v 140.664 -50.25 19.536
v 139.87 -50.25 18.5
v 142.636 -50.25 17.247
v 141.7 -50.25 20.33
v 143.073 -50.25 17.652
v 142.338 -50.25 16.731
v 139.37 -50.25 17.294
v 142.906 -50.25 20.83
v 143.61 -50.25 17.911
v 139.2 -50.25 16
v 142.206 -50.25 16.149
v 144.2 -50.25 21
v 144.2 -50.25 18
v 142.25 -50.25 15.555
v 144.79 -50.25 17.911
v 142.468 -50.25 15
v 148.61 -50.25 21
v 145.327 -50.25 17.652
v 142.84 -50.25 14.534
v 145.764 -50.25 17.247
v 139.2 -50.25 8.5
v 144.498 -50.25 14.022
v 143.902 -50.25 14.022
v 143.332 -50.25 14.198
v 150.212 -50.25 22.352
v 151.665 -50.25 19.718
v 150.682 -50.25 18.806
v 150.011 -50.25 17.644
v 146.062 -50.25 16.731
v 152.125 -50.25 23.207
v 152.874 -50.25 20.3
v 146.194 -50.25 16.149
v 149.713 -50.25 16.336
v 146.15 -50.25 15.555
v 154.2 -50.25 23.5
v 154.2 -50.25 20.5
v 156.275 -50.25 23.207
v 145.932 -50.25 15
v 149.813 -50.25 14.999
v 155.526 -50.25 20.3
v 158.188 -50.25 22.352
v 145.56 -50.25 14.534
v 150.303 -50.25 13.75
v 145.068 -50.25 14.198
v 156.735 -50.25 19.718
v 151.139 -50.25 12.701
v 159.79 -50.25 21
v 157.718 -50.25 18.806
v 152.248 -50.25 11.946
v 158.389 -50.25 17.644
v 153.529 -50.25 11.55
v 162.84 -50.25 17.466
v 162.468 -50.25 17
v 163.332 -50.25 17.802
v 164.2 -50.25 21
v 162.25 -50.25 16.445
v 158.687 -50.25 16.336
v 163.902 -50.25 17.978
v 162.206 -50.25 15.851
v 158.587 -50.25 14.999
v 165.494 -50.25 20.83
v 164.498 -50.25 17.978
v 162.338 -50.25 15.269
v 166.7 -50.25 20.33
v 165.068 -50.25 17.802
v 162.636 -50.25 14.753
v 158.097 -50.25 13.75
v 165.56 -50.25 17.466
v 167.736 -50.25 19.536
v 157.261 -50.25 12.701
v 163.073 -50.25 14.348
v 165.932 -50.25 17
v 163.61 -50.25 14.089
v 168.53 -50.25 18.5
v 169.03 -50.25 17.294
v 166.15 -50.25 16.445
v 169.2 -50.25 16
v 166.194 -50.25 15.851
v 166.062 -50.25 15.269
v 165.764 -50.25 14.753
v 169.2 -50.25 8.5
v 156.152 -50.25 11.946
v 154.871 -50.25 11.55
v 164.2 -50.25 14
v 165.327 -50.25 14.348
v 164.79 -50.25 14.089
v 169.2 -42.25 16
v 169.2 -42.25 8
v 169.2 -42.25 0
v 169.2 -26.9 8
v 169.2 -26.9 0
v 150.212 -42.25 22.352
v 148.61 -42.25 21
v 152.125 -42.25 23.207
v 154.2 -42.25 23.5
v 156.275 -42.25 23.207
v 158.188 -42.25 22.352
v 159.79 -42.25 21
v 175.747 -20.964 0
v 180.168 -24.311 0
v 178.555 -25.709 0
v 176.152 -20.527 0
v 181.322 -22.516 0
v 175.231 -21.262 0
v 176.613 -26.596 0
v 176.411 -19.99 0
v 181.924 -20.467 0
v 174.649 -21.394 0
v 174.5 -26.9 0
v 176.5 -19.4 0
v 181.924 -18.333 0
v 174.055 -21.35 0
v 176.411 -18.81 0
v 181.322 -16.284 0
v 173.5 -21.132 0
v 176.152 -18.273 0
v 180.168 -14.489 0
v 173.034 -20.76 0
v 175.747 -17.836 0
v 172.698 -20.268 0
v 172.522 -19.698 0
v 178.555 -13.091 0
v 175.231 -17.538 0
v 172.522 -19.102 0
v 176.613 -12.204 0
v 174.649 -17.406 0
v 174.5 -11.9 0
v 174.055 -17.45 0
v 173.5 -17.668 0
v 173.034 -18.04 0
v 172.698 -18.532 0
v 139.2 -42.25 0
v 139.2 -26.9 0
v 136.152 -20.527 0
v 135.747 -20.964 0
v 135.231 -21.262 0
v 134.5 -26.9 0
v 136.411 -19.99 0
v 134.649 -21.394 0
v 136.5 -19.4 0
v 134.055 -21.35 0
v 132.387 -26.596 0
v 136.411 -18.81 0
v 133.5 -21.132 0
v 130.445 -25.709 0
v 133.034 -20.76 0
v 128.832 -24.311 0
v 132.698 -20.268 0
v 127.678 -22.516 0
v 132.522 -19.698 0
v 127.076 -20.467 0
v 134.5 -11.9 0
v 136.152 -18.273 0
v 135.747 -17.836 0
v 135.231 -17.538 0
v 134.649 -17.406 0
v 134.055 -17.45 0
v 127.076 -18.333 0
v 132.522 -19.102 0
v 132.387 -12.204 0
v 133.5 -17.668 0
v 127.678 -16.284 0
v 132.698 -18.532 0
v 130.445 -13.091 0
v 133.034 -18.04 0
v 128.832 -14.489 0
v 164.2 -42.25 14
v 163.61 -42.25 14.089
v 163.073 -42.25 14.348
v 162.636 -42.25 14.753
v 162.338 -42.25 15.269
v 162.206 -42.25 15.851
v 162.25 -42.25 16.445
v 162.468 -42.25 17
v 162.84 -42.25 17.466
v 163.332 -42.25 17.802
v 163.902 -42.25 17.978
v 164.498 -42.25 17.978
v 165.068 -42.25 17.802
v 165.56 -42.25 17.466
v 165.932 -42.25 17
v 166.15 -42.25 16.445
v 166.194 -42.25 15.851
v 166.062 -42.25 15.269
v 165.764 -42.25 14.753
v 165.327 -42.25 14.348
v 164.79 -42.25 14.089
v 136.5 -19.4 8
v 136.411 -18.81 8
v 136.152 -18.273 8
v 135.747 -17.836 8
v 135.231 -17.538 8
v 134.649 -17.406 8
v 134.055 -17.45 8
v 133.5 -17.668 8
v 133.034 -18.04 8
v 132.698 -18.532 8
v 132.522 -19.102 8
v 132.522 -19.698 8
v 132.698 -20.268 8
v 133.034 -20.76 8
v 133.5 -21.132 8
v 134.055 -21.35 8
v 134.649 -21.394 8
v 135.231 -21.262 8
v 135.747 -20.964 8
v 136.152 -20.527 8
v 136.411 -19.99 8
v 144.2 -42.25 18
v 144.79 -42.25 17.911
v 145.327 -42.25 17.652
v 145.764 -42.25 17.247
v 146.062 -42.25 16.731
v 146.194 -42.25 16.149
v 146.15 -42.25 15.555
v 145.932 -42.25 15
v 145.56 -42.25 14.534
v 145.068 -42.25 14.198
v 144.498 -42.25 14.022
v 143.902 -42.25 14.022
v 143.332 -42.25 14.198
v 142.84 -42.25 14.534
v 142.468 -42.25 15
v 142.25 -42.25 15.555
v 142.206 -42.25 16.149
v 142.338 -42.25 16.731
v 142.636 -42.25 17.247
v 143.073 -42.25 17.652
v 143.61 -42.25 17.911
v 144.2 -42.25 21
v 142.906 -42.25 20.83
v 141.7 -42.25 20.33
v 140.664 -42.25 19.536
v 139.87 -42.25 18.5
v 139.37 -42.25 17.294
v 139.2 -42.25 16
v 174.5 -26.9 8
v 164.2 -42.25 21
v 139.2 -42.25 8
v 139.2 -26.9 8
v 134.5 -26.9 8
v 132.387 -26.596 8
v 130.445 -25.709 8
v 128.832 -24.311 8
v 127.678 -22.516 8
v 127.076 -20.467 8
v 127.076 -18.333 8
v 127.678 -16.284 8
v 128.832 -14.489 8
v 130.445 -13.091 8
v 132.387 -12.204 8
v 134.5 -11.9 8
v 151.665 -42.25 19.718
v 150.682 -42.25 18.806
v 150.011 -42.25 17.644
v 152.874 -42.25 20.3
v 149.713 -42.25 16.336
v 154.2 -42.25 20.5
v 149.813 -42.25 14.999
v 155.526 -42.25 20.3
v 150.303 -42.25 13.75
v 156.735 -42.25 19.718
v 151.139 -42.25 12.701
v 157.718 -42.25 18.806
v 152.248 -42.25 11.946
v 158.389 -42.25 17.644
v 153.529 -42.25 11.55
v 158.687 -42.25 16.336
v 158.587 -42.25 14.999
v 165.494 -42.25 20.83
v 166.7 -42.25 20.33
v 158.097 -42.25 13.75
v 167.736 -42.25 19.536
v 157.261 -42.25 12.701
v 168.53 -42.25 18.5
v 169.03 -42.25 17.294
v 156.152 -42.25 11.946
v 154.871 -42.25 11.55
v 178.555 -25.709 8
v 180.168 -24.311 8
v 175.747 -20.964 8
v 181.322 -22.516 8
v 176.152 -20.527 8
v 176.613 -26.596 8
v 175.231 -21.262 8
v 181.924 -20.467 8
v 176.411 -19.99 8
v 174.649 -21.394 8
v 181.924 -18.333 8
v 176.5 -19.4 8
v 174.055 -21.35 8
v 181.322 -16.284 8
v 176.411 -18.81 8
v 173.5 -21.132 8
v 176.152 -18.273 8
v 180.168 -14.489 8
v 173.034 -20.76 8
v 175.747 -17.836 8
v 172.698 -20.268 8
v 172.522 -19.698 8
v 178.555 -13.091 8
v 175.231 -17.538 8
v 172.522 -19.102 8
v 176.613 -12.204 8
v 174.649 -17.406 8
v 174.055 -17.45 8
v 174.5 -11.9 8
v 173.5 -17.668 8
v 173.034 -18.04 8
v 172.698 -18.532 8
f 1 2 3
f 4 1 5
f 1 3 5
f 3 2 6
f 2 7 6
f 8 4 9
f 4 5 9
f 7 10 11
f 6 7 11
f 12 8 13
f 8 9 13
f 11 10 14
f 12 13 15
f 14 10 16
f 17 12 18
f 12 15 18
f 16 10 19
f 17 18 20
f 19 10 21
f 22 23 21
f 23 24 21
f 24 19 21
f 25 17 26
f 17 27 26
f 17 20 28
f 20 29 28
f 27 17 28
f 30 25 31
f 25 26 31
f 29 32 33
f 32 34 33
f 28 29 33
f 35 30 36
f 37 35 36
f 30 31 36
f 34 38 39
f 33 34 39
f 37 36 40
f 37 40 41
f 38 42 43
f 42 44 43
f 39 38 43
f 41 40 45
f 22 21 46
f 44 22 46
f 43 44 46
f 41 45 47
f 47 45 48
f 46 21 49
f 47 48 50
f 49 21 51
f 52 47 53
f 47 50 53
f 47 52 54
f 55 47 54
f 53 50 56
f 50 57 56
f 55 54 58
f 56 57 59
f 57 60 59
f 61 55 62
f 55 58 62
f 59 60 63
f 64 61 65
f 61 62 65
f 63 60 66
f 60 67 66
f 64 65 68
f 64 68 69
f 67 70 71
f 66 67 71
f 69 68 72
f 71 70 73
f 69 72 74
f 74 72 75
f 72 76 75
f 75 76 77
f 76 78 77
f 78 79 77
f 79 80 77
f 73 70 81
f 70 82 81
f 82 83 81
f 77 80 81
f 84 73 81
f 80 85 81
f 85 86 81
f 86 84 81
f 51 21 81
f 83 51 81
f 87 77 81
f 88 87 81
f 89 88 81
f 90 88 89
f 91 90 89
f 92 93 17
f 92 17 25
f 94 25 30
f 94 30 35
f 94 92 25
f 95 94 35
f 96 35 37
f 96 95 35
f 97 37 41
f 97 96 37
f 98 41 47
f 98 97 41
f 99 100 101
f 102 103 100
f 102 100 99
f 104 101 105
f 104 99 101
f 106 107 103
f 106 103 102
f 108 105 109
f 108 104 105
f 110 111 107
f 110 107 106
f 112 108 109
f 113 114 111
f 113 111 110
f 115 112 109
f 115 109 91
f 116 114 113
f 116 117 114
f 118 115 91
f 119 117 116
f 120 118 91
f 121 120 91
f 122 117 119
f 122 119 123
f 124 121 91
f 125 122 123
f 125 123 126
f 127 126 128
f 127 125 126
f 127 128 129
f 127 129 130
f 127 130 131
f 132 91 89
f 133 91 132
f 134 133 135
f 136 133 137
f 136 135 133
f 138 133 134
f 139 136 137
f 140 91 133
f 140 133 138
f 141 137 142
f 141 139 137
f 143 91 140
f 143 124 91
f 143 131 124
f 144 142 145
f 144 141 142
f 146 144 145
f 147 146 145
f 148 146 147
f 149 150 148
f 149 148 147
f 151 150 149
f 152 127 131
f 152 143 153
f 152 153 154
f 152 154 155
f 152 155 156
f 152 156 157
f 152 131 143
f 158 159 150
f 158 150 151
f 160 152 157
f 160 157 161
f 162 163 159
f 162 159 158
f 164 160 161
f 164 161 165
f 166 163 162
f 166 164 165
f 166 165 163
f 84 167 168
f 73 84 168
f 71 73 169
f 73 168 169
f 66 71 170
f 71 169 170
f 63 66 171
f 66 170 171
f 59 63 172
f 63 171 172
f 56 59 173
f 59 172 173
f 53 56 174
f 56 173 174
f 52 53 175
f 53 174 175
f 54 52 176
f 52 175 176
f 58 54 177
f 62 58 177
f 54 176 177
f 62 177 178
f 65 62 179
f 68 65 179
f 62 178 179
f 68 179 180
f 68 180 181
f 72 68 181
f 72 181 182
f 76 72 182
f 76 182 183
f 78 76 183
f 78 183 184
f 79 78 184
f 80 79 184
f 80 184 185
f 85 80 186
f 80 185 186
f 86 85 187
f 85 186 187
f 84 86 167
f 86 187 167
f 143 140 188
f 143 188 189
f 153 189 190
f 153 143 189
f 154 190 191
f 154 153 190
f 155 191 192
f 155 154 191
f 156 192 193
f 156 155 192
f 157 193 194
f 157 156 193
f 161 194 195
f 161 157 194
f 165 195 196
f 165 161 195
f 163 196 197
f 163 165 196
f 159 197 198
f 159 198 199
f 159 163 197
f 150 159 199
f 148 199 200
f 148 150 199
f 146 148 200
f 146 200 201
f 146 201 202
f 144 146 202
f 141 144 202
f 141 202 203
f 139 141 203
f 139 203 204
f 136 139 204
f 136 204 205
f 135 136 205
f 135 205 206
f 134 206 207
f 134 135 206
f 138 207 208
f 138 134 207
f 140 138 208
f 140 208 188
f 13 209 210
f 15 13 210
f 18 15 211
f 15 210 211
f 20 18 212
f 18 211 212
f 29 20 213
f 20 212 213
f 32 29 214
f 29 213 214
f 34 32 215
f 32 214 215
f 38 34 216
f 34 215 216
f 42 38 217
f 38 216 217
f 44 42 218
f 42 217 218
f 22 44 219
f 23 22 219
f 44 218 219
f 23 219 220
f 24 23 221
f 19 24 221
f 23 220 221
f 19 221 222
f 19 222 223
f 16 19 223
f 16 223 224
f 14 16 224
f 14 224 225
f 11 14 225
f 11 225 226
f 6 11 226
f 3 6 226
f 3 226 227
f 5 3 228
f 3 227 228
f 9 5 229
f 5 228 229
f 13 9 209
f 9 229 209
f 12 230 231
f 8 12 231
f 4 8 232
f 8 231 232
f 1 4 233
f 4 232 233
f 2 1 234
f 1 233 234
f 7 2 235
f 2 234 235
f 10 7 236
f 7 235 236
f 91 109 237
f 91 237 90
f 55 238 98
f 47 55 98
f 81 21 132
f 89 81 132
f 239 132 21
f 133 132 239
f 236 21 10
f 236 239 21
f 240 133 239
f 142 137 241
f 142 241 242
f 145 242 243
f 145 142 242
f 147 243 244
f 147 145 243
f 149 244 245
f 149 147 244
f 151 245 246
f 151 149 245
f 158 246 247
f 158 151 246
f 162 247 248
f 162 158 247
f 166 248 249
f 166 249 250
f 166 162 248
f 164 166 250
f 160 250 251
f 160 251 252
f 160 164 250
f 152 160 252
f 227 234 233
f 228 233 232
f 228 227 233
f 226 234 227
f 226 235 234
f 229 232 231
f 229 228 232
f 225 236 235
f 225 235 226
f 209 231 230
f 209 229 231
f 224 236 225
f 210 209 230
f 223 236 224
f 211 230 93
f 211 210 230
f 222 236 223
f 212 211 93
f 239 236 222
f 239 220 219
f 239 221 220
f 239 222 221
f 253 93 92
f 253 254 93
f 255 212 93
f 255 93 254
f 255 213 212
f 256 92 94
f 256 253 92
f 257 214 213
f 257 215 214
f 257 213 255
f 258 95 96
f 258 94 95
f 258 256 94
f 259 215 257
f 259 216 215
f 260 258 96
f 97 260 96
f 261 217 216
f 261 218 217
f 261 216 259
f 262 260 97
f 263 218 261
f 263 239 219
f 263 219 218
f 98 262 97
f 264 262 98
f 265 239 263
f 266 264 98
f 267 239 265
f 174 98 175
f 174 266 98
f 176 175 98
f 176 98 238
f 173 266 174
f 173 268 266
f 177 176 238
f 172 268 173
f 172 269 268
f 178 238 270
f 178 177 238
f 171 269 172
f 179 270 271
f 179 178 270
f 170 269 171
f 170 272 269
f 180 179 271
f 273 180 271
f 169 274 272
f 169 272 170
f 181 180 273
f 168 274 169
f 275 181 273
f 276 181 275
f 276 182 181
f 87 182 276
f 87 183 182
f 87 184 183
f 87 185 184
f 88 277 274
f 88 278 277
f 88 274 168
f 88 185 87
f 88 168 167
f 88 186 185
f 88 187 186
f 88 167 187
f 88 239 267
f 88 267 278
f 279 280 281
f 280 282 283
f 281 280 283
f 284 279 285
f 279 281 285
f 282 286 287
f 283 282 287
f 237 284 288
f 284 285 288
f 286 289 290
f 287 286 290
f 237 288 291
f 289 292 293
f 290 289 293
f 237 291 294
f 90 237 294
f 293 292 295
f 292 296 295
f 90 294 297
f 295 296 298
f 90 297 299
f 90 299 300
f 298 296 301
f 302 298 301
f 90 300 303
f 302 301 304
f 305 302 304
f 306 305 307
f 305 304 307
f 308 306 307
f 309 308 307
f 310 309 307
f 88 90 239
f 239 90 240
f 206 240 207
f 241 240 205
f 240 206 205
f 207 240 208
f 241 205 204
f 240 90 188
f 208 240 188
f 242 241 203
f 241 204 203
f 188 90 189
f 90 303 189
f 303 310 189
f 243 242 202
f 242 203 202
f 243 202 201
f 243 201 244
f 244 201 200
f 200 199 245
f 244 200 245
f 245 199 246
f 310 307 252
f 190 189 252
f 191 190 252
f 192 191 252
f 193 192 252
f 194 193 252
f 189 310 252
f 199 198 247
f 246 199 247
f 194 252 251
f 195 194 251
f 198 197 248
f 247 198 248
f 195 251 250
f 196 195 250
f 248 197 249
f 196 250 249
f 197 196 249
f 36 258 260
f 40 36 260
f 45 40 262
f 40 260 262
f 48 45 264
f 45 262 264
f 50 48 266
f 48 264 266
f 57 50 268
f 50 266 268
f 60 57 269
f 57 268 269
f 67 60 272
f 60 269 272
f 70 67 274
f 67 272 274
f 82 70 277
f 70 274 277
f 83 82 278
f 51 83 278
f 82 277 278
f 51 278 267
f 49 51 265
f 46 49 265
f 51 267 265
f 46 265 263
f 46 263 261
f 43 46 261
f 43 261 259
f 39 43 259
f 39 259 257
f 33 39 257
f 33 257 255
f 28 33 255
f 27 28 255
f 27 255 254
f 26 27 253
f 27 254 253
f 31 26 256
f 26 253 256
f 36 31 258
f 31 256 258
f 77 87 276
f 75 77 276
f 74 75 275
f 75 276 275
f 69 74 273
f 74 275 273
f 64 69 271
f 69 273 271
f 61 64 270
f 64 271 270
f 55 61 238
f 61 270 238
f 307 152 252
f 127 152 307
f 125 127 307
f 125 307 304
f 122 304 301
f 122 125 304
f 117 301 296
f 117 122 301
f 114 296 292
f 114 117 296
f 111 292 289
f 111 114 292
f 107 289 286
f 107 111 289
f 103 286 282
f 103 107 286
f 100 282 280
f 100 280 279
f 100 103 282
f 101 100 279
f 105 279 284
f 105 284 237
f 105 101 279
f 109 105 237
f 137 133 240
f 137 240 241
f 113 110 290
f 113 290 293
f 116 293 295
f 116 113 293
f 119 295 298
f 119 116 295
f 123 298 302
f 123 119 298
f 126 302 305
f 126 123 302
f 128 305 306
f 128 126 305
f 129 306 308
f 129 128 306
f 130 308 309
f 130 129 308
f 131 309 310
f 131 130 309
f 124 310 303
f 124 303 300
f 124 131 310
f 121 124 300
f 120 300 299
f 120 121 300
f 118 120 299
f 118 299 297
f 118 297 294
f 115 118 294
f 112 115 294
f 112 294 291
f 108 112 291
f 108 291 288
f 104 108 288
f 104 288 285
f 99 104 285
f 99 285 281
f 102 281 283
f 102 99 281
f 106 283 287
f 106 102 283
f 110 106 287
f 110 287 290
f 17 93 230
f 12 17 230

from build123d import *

# Parameters (mm, degrees)
SKETCH1_R           = 2
BOSS_EXTRUDE1_DEPTH = 8
SKETCH2_R           = 7.5
SKETCH2_R_2         = 4.5
BOSS_EXTRUDE2_DEPTH = 8
SKETCH3_R           = 2
BOSS_EXTRUDE3_DEPTH = 8
SKETCH8_W           = 30
SKETCH8_H           = 8
BOSS_EXTRUDE7_DEPTH = 15.35
BOSS_EXTRUDE8_DEPTH = 30
BOSS_EXTRUDE9_DEPTH = 8


with BuildPart() as part:
    # Sketch1 → Boss-Extrude1 (new body)
    with BuildSketch(Plane.XY):
        with BuildLine():
            Line((134.5, -11.9), (174.5, -11.9))
            ThreePointArc((174.5, -11.9), (182, -19.4), (174.5, -26.9))
            Line((174.5, -26.9), (134.5, -26.9))
            ThreePointArc((134.5, -26.9), (127, -19.4), (134.5, -11.9))
        make_face()
        with Locations((134.5, -19.4)):
            Circle(SKETCH1_R, mode=Mode.SUBTRACT)
        with Locations((174.5, -19.4)):
            Circle(SKETCH1_R, mode=Mode.SUBTRACT)
    extrude(amount=BOSS_EXTRUDE1_DEPTH)

    # Sketch8 → Boss-Extrude7 (add)
    with BuildSketch(Plane(origin=(0, -26.9, 0), x_dir=(-1, 0, 0), z_dir=(0, -1, 0))):
        with Locations((-154.2, -4)):
            Rectangle(SKETCH8_W, SKETCH8_H)
    extrude(amount=BOSS_EXTRUDE7_DEPTH)



with BuildPart() as body_2:
    # Sketch2 → Boss-Extrude2 (new body)
    with BuildSketch(Plane(origin=(0, -42.25, 0), x_dir=(1, 0, 0), z_dir=(0, 1, 0))):
        with Locations(Location((154.2, -16, 0), (0, 0, 270))):
            Circle(SKETCH2_R)
        with Locations(Location((154.2, -16, 0), (0, 0, 270))):
            Circle(SKETCH2_R_2, mode=Mode.SUBTRACT)
    extrude(amount=-BOSS_EXTRUDE2_DEPTH)

    # Sketch3 → Boss-Extrude3 (add)
    # profile 1 of 2: a face of its own
    with BuildSketch(Plane(origin=(0, -42.25, 0), x_dir=(1, 0, 0), z_dir=(0, 1, 0))):
        with BuildLine():
            Line((144.2, -11), (148.609830056, -11))
            ThreePointArc((148.609830056, -11), (146.7, -16), (148.609830056, -21))
            Line((148.609830056, -21), (144.2, -21))
            ThreePointArc((144.2, -21), (139.2, -16), (144.2, -11))
        make_face()
        with Locations(Location((144.2, -16, 0), (0, 0, 270))):
            Circle(SKETCH3_R, mode=Mode.SUBTRACT)
    # profile 2 of 2: a face of its own
    with BuildSketch(Plane(origin=(0, -42.25, 0), x_dir=(1, 0, 0), z_dir=(0, 1, 0))):
        with BuildLine():
            Line((164.2, -21), (159.790169944, -21))
            ThreePointArc((159.790169944, -21), (161.7, -16), (159.790169944, -11))
            Line((159.790169944, -11), (164.2, -11))
            ThreePointArc((164.2, -11), (169.2, -16), (164.2, -21))
        make_face()
        with Locations(Location((164.2, -16, 0), (0, 0, 90))):
            Circle(SKETCH3_R, mode=Mode.SUBTRACT)
    extrude(amount=-BOSS_EXTRUDE3_DEPTH)


with BuildPart() as part_1:
    add(part.part)

    add(body_2.part)  # Boss-Extrude8 merges body 2
    # Sketch9 → Boss-Extrude8 (add)
    with BuildSketch(Plane(origin=(169.2, 0, 0), x_dir=(0, 0, -1), z_dir=(1, 0, 0))):
        Polygon((-11, -50.25), (-8.5, -50.25), (0, -42.25), (-8, -42.25), (-11, -42.25), align=None)
    extrude(amount=-BOSS_EXTRUDE8_DEPTH)

    # Sketch10 → Boss-Extrude9 (add, through all)
    with BuildSketch(Plane(origin=(0, -42.25, 0), x_dir=(1, 0, 0), z_dir=(0, 1, 0))):
        with BuildLine():
            Line((139.2, -11), (139.2, -16))
            ThreePointArc((139.2, -16), (140.664466094, -12.464466094), (144.2, -11))
            Line((144.2, -11), (139.2, -11))
        make_face()
        with BuildLine():
            Line((169.2, -11), (164.2, -11))
            ThreePointArc((164.2, -11), (167.735533906, -12.464466094), (169.2, -16))
            Line((169.2, -16), (169.2, -11))
        make_face()
    extrude(amount=-BOSS_EXTRUDE9_DEPTH)


solid = part_1.part
